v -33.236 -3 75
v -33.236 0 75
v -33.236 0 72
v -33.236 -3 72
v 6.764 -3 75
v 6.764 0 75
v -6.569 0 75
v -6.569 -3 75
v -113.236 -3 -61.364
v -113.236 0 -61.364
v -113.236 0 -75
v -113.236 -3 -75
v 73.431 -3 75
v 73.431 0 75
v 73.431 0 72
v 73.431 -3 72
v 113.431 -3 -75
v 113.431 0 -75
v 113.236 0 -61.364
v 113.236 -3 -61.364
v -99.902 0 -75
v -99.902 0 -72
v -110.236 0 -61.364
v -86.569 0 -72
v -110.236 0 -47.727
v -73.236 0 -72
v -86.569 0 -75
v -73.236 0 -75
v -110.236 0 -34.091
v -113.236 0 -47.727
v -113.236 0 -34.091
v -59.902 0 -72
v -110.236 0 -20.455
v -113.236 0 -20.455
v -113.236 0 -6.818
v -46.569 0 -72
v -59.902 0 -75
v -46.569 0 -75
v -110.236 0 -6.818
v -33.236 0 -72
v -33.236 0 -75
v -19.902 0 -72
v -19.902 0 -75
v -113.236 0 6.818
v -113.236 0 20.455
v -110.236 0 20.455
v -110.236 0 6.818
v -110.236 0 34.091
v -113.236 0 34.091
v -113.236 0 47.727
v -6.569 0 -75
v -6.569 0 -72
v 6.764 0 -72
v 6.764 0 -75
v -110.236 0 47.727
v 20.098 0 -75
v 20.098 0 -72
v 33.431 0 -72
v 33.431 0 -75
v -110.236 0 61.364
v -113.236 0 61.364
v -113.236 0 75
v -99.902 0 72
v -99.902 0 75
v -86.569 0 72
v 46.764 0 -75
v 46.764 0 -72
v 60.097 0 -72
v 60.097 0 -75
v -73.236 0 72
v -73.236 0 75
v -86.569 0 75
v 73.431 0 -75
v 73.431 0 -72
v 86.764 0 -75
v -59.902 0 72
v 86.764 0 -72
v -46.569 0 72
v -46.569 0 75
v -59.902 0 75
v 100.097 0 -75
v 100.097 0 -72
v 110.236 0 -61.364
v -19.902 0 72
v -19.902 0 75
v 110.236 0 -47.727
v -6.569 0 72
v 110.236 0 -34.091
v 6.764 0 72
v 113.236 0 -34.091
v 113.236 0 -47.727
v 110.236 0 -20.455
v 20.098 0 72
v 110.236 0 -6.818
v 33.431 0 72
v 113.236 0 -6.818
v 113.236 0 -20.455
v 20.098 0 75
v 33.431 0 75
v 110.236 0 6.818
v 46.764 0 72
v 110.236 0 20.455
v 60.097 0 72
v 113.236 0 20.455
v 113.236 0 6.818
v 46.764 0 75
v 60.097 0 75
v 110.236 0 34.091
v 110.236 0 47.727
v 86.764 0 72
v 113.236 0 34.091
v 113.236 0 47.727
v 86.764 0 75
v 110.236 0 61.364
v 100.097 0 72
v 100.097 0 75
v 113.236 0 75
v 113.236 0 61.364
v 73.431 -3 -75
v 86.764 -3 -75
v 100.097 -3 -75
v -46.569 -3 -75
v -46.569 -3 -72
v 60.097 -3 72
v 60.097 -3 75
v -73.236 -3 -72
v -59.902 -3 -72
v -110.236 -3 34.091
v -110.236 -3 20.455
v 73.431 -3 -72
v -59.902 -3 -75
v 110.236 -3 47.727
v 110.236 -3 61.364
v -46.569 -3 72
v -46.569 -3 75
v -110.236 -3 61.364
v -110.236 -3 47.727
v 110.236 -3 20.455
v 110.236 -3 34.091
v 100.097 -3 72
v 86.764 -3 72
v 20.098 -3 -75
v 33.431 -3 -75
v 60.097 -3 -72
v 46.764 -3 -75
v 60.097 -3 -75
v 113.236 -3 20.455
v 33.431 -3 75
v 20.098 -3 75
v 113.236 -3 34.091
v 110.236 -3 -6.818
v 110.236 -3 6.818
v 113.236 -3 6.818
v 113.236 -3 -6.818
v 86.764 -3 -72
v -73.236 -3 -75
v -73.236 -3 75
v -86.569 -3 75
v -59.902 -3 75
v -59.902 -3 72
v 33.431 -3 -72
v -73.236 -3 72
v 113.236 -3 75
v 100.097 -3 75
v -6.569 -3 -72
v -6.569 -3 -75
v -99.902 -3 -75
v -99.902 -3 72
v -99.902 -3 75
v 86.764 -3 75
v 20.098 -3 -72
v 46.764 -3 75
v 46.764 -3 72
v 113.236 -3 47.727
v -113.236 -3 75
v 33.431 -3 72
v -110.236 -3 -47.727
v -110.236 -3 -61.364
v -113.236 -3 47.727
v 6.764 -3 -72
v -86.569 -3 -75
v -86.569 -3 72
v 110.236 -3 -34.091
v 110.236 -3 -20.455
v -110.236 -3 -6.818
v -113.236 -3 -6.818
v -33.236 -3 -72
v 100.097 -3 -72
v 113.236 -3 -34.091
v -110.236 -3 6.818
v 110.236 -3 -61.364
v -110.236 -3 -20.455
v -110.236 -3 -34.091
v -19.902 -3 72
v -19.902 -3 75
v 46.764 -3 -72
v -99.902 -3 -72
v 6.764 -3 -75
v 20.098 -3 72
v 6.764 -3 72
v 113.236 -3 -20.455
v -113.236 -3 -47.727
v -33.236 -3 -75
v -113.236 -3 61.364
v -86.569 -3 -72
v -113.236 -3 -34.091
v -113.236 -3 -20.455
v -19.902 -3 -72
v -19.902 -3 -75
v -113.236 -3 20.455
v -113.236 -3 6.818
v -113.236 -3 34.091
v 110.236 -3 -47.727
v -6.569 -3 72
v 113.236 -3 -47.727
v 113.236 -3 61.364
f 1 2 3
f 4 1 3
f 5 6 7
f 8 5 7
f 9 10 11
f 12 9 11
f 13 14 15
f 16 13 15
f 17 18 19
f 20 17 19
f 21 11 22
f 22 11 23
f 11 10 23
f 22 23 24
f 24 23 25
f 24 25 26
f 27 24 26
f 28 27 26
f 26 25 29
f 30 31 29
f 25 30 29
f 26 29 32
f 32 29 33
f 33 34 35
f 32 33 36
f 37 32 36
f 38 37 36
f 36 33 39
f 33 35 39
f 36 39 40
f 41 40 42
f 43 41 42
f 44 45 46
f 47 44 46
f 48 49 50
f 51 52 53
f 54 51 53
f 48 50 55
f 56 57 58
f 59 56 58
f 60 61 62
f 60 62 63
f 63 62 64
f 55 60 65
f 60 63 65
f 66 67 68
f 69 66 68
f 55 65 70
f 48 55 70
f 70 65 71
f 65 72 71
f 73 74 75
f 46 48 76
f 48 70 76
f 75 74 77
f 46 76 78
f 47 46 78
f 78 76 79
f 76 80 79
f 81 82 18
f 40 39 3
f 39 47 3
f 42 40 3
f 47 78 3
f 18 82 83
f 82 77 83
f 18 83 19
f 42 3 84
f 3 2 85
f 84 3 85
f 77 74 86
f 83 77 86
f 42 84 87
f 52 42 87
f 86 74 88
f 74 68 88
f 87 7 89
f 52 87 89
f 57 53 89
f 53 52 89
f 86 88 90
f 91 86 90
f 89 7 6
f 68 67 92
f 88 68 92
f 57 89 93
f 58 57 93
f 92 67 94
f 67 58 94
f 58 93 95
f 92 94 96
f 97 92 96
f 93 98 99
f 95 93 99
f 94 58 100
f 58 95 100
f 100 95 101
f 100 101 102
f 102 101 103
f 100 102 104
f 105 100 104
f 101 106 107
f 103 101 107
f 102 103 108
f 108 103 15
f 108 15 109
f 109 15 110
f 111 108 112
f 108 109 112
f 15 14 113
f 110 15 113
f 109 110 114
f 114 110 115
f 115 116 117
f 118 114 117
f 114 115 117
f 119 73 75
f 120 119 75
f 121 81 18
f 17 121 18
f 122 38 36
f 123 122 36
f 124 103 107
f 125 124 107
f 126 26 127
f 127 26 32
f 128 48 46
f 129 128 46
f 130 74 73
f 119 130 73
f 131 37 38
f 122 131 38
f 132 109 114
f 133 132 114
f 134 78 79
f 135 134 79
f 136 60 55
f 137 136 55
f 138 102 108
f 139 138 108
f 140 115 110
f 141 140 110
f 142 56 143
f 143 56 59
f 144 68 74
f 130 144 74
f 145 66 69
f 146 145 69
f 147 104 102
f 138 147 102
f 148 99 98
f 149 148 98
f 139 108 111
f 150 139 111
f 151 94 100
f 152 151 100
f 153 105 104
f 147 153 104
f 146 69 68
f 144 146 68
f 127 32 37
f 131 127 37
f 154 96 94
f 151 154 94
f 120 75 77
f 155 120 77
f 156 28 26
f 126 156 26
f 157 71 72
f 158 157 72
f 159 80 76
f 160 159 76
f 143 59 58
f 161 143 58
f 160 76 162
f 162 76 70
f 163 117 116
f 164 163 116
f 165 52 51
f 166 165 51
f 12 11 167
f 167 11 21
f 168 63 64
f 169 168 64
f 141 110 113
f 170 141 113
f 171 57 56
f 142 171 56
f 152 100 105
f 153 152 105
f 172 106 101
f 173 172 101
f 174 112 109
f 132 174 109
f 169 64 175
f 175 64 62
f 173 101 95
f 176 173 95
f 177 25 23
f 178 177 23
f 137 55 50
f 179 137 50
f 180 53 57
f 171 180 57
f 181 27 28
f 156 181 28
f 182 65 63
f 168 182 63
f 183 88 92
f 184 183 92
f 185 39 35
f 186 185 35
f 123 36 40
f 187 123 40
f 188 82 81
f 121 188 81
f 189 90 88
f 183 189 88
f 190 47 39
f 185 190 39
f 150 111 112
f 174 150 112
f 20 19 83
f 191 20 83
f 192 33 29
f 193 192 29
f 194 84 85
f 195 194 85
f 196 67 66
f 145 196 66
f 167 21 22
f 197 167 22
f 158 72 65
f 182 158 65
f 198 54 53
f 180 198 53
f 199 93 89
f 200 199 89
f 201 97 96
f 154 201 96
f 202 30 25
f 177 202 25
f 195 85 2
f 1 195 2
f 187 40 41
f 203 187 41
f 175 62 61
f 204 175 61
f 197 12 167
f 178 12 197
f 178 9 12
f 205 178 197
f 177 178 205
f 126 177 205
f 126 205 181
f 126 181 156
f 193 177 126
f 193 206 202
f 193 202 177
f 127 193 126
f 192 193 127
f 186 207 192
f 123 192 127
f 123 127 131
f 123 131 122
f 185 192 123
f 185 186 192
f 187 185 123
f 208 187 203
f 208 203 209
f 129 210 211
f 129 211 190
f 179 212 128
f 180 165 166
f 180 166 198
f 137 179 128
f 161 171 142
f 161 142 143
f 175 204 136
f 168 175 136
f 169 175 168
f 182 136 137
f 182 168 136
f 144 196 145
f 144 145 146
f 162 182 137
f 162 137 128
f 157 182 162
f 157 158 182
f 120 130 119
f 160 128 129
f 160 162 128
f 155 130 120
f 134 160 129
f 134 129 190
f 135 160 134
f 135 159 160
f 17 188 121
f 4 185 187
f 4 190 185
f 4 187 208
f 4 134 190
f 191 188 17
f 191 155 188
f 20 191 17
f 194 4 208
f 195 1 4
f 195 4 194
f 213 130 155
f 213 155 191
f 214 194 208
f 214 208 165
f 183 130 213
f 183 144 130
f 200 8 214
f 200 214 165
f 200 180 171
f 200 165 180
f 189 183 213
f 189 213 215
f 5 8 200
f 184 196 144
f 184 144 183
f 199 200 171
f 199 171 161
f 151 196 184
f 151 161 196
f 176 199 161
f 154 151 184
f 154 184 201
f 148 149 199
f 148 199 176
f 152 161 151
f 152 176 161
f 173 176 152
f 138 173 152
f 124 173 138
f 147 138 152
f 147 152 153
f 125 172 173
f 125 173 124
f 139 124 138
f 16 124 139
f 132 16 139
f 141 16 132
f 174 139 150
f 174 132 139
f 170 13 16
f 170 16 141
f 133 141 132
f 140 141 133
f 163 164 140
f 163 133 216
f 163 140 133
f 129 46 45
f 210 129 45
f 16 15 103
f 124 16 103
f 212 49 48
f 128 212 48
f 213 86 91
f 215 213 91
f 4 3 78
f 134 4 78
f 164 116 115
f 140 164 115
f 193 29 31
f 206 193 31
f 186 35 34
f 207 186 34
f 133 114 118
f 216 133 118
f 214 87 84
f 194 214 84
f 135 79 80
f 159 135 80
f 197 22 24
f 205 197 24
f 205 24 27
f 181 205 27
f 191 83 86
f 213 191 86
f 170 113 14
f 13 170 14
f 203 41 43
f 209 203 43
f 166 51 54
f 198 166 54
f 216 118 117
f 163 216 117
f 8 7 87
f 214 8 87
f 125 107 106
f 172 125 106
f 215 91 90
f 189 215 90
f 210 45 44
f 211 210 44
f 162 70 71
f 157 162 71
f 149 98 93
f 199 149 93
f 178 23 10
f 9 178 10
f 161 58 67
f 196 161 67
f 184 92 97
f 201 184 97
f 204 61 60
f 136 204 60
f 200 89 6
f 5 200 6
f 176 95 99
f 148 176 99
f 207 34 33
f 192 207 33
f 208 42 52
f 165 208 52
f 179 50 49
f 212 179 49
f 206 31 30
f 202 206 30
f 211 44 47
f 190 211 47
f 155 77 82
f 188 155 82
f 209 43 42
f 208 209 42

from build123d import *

# Parameters (mm, degrees)
F1_DEPTH = 3


with BuildPart() as f1:
    # F0 (on Front) → F1 (new body)
    with BuildSketch(Plane.XZ):
        Polygon((113.2355, 61.363636), (113.2355, 75), (100.097, 75), (100.097, 71.999997), (86.7637, 71.999997), (86.7637, 75), (73.4307, 75), (73.4307, 72), (60.0974, 72), (60.0974, 75), (46.7641, 75), (46.7641, 72), (33.4308, 72), (33.4308, 75), (20.0975, 75), (20.0975, 72), (6.7642, 72), (6.7642, 75), (-6.5691, 75), (-6.5691, 72), (-19.9024, 72), (-19.9024, 75), (-33.2357, 75), (-33.2357, 72), (-46.569, 72), (-46.569, 75), (-59.9023, 75), (-59.9023, 72), (-73.2356, 72), (-73.2356, 75), (-86.5689, 75), (-86.5689, 72), (-99.9022, 72), (-99.9022, 75), (-113.2355, 75), (-113.2355, 61.363636), (-110.2355, 61.363636), (-110.2355, 47.727273), (-113.2355, 47.727273), (-113.2355, 34.090909), (-110.2355, 34.090909), (-110.2355, 20.454545), (-113.2355, 20.454545), (-113.2355, 6.818182), (-110.2355, 6.818182), (-110.2355, -6.818182), (-113.2355, -6.818182), (-113.2355, -20.454545), (-110.2355, -20.454545), (-110.2355, -34.090909), (-113.2355, -34.090909), (-113.2355, -47.727273), (-110.2355, -47.727273), (-110.2355, -61.363636), (-113.2355, -61.363636), (-113.2355, -75), (-99.9022, -75), (-99.9022, -72), (-86.5689, -72), (-86.5689, -75), (-73.2356, -75), (-73.2356, -72), (-59.9023, -72), (-59.9023, -75), (-46.569, -75), (-46.569, -72), (-33.2357, -72), (-33.2357, -75), (-19.9024, -75), (-19.9024, -72), (-6.5691, -72), (-6.5691, -75), (6.7642, -75), (6.7642, -72), (20.0975, -72), (20.0975, -75), (33.4308, -75), (33.4308, -72), (46.7641, -72), (46.7641, -75), (60.0974, -75), (60.0974, -72), (73.4307, -72), (73.4307, -75), (86.7637, -75), (86.7637, -71.999997), (100.097, -71.999997), (100.097, -75), (113.2355, -75), (113.4308, -75), (113.2355, -61.363636), (110.2355, -61.363636), (110.2355, -47.727273), (113.2355, -47.727273), (113.2355, -34.090909), (110.2355, -34.090909), (110.2355, -20.454545), (113.2355, -20.454545), (113.2355, -6.818182), (110.2355, -6.818182), (110.2355, 6.818182), (113.2355, 6.818182), (113.2355, 20.454545), (110.2355, 20.454545), (110.2355, 34.090909), (113.2355, 34.090909), (113.2355, 47.727273), (110.2355, 47.727273), (110.2355, 61.363636), align=None)
    extrude(amount=F1_DEPTH)


solid = f1.part
